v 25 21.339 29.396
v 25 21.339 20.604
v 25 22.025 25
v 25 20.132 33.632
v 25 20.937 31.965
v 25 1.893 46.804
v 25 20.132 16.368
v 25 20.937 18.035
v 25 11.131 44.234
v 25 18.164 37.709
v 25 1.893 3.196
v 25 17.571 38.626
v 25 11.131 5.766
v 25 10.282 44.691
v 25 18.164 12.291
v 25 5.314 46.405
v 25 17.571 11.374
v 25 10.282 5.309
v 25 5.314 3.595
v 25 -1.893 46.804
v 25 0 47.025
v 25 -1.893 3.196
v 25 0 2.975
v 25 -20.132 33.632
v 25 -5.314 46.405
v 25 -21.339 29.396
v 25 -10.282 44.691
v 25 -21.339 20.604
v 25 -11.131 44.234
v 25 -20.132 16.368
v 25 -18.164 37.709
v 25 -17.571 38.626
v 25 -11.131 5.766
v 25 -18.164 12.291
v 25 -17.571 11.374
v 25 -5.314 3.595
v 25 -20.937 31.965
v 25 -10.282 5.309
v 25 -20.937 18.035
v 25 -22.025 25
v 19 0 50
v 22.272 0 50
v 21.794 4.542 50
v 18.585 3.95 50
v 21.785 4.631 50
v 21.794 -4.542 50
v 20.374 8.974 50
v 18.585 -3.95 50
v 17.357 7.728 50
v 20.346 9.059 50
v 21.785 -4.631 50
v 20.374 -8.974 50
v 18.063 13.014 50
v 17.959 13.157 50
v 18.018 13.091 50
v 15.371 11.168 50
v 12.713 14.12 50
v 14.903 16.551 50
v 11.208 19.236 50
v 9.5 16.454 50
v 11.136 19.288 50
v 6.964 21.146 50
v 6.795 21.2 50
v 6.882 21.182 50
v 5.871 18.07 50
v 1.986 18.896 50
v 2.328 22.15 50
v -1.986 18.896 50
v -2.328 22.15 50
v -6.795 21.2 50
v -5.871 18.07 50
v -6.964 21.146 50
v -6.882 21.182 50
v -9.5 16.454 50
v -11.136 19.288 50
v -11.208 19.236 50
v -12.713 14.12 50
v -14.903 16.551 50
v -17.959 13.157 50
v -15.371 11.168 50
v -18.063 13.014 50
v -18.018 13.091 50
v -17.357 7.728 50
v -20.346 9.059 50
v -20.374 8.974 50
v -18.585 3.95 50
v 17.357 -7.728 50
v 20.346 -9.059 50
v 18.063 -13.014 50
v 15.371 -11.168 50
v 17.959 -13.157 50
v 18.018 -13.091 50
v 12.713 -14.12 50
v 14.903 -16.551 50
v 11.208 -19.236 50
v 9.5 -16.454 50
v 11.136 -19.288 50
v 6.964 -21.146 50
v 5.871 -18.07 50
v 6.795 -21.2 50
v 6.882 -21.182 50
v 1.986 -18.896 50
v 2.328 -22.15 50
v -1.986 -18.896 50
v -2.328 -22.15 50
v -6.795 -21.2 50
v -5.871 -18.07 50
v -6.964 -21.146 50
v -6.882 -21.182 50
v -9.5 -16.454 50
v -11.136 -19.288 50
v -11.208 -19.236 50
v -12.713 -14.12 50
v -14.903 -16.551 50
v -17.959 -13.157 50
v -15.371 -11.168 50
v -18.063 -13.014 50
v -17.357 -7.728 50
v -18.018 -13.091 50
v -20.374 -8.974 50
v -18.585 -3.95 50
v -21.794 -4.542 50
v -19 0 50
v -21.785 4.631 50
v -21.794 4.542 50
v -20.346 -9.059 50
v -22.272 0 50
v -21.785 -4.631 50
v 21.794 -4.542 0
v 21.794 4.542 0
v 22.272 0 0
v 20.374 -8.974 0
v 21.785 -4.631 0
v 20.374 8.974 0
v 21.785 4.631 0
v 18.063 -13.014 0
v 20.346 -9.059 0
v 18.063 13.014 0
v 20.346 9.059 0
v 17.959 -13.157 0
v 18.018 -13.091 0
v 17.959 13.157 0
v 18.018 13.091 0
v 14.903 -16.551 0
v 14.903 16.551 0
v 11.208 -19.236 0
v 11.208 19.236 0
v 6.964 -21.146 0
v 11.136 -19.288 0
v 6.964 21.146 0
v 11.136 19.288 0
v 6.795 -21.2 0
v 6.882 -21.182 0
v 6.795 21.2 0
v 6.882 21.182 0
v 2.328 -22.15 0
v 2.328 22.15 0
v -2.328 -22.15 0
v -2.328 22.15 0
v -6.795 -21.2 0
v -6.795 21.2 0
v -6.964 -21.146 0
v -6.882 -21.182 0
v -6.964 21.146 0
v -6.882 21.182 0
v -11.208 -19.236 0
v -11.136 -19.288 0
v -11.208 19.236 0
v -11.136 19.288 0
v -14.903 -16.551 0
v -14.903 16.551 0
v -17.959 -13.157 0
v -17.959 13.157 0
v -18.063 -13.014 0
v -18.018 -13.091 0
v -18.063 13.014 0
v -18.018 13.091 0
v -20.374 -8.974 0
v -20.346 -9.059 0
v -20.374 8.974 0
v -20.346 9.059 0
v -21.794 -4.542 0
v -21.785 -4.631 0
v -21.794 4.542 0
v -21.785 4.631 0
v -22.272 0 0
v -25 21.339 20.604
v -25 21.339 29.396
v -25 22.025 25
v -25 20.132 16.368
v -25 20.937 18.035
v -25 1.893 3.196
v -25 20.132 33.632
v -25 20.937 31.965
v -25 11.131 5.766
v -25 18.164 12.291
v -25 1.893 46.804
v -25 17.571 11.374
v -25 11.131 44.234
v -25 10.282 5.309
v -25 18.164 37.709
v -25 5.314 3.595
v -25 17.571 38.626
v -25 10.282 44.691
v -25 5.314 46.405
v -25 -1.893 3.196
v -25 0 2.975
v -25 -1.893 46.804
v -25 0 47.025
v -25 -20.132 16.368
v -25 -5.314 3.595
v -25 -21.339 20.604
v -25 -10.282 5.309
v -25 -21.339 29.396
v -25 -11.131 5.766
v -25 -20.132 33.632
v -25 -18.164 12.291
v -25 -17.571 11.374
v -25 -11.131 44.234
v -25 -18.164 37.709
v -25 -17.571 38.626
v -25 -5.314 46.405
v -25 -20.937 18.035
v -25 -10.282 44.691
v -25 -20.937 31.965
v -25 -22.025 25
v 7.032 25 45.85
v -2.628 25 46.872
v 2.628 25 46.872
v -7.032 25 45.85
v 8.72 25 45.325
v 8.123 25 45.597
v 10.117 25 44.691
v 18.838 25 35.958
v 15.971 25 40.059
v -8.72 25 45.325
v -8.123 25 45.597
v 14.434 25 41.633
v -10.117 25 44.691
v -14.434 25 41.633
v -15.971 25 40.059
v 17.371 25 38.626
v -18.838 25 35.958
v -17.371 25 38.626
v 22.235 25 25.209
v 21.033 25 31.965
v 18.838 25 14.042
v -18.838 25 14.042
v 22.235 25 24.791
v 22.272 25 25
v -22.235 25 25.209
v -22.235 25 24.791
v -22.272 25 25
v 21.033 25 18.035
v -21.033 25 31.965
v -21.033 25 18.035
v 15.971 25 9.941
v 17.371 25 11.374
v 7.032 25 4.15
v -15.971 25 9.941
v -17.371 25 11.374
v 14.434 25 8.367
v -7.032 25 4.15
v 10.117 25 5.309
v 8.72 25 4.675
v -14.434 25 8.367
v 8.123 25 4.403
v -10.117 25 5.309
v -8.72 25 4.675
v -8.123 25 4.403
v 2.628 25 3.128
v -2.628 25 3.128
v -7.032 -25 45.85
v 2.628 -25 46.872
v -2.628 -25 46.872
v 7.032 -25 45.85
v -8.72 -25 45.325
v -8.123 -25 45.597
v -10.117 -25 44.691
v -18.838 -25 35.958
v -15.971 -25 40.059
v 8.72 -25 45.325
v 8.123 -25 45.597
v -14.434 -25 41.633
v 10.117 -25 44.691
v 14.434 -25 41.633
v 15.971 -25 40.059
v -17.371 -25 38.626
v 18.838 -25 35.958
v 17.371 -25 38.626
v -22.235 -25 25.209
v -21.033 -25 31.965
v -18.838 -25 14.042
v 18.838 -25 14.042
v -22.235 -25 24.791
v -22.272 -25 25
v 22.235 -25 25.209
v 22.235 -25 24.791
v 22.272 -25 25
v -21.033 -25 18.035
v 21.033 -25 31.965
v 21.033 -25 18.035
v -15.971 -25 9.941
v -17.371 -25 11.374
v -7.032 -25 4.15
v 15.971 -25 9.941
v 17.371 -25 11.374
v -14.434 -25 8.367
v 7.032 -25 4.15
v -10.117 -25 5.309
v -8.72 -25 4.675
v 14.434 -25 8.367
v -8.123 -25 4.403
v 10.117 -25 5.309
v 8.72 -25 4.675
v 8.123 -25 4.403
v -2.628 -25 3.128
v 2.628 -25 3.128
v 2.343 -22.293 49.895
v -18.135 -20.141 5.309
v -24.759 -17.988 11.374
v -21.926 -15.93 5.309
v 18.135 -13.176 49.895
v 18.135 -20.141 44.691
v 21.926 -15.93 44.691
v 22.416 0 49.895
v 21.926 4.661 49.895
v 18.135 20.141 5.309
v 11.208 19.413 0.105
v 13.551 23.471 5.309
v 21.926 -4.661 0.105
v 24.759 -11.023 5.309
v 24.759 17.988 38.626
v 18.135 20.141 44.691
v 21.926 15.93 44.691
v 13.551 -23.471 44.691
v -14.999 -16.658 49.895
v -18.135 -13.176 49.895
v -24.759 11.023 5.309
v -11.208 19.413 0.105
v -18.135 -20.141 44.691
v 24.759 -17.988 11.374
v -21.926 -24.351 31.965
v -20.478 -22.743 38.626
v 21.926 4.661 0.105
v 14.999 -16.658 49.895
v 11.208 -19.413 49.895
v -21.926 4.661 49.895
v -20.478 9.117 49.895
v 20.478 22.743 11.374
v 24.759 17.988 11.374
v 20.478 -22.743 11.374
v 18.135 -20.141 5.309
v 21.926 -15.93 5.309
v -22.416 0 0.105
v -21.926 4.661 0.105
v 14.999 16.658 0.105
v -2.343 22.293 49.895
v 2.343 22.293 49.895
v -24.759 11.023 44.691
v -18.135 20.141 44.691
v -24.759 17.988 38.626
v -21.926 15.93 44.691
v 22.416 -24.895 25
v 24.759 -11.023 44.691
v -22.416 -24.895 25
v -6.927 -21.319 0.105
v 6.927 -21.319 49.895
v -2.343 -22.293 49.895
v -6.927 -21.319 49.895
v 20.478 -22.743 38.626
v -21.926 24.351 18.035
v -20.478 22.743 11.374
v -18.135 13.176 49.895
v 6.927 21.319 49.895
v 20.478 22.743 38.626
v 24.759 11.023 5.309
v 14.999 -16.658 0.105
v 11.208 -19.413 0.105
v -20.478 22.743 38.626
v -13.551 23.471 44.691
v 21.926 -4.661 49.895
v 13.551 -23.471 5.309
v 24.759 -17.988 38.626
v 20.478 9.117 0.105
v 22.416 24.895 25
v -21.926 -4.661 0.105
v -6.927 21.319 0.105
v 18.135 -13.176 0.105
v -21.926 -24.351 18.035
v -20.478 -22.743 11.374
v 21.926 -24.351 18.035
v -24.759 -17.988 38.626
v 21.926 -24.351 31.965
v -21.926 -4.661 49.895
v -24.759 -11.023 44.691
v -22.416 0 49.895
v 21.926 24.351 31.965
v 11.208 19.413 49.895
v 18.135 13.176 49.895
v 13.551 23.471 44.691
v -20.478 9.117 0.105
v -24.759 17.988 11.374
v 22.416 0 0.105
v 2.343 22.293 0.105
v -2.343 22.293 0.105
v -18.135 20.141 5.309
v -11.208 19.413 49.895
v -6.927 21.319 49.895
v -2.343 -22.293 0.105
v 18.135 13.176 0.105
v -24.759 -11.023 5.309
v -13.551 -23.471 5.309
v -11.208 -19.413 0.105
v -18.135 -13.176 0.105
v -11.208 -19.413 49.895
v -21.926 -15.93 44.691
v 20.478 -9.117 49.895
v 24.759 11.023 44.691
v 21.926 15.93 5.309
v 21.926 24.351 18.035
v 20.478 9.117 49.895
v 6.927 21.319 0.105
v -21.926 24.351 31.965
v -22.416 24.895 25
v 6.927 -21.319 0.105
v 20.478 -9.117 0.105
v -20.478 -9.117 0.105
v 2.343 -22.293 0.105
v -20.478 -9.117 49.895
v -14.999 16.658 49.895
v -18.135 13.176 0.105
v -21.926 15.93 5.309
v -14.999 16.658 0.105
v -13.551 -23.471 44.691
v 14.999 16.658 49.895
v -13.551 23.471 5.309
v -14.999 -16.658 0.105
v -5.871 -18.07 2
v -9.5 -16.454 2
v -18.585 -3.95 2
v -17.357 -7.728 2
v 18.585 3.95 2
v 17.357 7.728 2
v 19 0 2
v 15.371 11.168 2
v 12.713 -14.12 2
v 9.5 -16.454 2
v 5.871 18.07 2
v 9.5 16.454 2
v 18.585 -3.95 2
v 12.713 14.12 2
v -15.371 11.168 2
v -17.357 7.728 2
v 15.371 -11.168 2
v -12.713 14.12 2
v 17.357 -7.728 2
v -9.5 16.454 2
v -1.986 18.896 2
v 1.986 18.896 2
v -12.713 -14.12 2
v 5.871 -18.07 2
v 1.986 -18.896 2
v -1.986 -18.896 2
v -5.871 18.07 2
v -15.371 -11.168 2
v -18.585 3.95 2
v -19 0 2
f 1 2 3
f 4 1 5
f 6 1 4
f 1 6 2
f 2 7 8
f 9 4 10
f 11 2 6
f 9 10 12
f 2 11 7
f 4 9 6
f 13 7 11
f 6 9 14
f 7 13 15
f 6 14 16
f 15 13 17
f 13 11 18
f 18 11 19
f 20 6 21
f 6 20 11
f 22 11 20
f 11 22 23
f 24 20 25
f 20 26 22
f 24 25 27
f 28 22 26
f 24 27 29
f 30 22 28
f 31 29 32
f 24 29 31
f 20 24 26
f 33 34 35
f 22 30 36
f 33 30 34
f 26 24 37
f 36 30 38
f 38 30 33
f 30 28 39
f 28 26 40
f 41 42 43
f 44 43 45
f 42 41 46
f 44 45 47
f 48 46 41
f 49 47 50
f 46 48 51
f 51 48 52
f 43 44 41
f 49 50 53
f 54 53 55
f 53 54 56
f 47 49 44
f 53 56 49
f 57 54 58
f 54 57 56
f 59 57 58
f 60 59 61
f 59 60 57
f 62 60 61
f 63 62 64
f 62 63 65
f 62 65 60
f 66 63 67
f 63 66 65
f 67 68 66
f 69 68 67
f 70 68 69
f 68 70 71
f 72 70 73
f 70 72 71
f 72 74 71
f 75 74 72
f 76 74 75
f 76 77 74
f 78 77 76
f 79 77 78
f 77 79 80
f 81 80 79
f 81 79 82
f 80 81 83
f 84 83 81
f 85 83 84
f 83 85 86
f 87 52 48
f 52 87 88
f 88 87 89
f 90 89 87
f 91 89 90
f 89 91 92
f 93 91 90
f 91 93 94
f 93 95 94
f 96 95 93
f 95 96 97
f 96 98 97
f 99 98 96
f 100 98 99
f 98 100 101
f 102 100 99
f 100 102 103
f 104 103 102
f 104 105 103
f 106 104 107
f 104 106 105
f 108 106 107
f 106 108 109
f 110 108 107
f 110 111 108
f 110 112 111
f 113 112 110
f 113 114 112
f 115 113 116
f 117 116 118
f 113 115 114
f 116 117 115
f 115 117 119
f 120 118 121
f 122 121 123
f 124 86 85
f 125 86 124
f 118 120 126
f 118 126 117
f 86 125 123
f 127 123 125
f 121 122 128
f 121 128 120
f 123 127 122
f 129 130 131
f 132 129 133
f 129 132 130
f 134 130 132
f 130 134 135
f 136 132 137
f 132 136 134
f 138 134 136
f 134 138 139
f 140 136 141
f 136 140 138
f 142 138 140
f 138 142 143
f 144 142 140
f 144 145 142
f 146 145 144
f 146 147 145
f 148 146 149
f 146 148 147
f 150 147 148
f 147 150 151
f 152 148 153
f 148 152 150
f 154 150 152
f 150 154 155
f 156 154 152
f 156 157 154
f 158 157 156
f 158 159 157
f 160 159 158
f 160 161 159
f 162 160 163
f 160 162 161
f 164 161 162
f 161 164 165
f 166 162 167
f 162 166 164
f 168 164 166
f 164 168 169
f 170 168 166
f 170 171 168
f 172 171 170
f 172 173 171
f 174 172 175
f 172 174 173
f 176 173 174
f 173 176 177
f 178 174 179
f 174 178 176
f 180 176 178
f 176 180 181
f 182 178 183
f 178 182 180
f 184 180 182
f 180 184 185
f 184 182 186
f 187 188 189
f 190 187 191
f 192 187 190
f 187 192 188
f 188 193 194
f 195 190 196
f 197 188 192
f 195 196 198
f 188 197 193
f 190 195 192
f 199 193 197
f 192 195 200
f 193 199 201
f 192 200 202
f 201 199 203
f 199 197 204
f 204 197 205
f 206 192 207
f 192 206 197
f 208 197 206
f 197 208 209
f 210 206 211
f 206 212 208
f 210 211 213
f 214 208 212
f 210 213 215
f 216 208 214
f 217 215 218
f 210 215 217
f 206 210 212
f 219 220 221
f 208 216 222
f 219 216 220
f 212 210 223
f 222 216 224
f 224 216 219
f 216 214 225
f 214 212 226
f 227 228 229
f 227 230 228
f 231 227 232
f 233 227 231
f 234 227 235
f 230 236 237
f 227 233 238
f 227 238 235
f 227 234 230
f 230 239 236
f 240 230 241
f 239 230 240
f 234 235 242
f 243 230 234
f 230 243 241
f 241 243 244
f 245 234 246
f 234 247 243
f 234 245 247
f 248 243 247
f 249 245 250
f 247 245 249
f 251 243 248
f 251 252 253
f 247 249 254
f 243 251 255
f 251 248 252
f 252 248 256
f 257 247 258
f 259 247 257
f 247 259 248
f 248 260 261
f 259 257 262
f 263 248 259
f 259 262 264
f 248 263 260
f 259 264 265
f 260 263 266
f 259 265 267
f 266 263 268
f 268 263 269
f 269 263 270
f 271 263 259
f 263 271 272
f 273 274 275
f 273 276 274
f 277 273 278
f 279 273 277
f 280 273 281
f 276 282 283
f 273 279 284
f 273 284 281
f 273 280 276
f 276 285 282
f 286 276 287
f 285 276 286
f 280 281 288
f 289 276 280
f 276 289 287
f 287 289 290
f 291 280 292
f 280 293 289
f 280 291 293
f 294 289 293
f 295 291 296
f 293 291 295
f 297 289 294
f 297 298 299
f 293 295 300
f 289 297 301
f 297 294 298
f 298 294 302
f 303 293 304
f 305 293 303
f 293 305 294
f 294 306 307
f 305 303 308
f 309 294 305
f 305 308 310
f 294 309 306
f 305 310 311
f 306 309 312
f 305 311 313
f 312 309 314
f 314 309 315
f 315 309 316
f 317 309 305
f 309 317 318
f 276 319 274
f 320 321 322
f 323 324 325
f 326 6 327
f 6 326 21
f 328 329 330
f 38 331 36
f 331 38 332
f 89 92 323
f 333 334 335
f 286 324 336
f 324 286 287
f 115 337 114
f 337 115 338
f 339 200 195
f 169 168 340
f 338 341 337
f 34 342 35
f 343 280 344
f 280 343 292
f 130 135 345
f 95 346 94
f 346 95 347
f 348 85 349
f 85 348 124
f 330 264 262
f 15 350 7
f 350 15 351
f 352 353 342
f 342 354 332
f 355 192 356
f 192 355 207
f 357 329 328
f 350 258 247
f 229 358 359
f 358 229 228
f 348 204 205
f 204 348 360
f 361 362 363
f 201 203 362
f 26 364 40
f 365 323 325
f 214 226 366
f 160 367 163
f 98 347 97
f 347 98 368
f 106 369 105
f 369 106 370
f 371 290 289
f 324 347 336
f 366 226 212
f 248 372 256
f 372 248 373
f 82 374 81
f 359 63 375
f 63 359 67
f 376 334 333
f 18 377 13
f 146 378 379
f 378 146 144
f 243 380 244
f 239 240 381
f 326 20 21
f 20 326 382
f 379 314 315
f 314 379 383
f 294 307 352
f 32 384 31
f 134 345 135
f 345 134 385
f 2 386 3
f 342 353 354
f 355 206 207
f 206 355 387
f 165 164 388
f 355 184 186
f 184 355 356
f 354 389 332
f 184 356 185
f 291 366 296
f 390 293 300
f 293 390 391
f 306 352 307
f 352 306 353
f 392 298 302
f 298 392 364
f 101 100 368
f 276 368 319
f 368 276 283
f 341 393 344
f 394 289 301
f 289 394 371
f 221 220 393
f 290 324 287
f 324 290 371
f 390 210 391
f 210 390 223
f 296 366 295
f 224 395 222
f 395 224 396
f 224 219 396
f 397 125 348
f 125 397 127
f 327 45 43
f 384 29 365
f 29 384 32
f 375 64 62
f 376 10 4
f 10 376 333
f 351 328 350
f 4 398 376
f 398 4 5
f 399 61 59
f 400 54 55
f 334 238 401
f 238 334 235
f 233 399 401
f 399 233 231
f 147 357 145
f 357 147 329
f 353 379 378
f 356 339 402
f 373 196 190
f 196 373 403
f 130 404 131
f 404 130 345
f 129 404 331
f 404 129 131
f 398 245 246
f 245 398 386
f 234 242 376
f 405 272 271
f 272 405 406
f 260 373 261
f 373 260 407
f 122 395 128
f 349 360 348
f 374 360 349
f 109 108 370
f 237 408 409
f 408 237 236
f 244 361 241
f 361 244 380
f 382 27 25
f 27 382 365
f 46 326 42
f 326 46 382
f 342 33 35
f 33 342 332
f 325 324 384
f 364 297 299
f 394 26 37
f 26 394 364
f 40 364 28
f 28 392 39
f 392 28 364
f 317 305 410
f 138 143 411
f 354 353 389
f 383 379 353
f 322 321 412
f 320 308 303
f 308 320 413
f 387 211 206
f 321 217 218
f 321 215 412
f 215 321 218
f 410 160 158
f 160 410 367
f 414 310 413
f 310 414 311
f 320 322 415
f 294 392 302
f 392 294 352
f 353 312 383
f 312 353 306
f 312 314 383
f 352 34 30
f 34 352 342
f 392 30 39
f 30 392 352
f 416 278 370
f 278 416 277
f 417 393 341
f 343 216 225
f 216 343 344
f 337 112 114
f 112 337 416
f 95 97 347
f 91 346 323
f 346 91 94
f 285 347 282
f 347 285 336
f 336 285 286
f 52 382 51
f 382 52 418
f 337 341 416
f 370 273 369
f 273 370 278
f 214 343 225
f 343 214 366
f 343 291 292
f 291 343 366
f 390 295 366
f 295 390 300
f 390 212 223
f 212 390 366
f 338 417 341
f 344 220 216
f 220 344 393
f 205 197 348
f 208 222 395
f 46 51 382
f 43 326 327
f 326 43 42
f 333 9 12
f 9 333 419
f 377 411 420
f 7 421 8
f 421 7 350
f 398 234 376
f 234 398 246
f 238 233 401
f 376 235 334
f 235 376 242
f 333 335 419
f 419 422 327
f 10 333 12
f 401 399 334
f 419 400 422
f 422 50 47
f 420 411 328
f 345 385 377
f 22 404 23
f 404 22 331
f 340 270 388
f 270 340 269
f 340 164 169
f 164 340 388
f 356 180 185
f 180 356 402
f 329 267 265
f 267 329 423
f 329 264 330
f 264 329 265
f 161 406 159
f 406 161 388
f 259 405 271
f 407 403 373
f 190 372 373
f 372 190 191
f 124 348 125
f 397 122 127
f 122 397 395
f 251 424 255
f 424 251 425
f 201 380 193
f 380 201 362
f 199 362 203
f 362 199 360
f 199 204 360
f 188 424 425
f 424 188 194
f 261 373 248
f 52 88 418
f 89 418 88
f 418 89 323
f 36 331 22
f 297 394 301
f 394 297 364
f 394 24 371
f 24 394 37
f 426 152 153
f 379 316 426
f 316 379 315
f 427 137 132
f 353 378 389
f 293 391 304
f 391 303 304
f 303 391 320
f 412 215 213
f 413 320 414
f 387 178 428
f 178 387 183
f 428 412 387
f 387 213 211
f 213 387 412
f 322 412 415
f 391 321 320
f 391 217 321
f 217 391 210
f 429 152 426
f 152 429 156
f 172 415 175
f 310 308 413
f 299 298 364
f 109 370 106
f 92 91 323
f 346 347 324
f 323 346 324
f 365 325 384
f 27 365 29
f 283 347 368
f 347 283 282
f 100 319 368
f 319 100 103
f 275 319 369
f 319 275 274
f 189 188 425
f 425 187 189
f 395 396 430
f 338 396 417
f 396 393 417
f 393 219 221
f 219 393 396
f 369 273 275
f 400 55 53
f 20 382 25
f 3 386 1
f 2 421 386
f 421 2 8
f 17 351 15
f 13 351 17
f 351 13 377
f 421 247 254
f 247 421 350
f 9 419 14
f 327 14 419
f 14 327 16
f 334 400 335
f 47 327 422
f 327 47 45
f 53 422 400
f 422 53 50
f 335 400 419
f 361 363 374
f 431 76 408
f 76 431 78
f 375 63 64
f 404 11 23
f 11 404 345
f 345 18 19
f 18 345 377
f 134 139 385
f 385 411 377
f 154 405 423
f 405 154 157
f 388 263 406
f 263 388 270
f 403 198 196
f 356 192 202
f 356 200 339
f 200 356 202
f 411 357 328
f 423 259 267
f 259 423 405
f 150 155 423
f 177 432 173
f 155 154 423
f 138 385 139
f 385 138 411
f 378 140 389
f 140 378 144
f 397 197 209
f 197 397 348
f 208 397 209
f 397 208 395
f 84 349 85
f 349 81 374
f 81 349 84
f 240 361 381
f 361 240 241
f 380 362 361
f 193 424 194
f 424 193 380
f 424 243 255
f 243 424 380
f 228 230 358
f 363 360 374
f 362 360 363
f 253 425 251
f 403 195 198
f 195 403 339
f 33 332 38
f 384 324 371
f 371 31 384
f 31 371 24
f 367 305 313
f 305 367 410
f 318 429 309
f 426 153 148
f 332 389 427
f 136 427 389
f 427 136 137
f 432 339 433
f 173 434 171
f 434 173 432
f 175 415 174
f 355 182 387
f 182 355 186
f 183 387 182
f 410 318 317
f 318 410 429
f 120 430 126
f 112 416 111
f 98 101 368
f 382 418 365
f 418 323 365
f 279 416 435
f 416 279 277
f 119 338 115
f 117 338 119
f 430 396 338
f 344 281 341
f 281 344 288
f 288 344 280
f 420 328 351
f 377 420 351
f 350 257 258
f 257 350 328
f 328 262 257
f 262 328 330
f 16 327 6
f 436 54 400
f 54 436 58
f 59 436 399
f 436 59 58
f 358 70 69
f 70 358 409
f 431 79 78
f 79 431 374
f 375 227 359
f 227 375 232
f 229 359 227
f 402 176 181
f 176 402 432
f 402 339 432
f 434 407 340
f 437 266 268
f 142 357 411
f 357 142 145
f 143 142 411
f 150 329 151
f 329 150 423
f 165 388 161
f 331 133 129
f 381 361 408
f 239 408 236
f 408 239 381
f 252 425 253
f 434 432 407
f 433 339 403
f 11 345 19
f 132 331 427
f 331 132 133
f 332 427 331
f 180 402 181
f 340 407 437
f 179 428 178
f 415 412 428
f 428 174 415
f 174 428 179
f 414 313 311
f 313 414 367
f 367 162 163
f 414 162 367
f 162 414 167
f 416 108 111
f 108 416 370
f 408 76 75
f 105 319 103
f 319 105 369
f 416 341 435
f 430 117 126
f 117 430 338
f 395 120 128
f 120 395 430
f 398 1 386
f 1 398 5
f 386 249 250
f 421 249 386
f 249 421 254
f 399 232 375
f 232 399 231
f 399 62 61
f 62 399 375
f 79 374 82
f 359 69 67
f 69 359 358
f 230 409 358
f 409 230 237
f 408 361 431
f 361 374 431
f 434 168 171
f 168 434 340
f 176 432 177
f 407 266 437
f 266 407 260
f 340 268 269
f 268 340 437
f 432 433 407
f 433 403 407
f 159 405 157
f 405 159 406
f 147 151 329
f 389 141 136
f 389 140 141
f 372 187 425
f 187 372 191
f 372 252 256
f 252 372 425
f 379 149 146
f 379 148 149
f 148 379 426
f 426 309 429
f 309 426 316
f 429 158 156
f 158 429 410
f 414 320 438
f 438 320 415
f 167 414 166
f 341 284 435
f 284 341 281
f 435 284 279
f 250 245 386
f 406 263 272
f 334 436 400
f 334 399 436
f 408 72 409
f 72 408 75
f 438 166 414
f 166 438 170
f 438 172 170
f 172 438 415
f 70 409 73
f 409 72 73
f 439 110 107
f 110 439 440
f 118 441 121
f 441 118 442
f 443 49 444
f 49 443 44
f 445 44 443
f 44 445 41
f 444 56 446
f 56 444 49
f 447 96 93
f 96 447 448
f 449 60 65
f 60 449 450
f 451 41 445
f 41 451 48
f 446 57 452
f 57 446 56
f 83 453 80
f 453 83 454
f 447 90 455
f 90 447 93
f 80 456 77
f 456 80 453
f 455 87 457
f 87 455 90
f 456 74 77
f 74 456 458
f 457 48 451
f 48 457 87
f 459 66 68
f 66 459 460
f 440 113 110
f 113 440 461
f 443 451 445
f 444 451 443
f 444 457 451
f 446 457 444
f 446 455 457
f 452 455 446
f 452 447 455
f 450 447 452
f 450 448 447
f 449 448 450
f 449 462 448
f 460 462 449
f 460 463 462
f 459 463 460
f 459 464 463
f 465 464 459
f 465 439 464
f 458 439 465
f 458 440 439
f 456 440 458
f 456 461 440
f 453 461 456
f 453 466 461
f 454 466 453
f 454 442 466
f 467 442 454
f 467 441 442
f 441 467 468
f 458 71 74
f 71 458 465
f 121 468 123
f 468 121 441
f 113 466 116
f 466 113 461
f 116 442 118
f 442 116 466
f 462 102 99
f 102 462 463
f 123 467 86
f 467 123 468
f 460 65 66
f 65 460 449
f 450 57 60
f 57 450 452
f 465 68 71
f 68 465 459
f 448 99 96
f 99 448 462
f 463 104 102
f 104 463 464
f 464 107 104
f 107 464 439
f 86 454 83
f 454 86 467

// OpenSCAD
difference()
{
translate([0, 0, 25])
{
intersection()
{
translate([-25, -25, -25])
{
cube(50);
}
sphere(6.7*5);
}
}
translate([0, 0, 2])
{
cylinder(h=50, r=19);
}
}
